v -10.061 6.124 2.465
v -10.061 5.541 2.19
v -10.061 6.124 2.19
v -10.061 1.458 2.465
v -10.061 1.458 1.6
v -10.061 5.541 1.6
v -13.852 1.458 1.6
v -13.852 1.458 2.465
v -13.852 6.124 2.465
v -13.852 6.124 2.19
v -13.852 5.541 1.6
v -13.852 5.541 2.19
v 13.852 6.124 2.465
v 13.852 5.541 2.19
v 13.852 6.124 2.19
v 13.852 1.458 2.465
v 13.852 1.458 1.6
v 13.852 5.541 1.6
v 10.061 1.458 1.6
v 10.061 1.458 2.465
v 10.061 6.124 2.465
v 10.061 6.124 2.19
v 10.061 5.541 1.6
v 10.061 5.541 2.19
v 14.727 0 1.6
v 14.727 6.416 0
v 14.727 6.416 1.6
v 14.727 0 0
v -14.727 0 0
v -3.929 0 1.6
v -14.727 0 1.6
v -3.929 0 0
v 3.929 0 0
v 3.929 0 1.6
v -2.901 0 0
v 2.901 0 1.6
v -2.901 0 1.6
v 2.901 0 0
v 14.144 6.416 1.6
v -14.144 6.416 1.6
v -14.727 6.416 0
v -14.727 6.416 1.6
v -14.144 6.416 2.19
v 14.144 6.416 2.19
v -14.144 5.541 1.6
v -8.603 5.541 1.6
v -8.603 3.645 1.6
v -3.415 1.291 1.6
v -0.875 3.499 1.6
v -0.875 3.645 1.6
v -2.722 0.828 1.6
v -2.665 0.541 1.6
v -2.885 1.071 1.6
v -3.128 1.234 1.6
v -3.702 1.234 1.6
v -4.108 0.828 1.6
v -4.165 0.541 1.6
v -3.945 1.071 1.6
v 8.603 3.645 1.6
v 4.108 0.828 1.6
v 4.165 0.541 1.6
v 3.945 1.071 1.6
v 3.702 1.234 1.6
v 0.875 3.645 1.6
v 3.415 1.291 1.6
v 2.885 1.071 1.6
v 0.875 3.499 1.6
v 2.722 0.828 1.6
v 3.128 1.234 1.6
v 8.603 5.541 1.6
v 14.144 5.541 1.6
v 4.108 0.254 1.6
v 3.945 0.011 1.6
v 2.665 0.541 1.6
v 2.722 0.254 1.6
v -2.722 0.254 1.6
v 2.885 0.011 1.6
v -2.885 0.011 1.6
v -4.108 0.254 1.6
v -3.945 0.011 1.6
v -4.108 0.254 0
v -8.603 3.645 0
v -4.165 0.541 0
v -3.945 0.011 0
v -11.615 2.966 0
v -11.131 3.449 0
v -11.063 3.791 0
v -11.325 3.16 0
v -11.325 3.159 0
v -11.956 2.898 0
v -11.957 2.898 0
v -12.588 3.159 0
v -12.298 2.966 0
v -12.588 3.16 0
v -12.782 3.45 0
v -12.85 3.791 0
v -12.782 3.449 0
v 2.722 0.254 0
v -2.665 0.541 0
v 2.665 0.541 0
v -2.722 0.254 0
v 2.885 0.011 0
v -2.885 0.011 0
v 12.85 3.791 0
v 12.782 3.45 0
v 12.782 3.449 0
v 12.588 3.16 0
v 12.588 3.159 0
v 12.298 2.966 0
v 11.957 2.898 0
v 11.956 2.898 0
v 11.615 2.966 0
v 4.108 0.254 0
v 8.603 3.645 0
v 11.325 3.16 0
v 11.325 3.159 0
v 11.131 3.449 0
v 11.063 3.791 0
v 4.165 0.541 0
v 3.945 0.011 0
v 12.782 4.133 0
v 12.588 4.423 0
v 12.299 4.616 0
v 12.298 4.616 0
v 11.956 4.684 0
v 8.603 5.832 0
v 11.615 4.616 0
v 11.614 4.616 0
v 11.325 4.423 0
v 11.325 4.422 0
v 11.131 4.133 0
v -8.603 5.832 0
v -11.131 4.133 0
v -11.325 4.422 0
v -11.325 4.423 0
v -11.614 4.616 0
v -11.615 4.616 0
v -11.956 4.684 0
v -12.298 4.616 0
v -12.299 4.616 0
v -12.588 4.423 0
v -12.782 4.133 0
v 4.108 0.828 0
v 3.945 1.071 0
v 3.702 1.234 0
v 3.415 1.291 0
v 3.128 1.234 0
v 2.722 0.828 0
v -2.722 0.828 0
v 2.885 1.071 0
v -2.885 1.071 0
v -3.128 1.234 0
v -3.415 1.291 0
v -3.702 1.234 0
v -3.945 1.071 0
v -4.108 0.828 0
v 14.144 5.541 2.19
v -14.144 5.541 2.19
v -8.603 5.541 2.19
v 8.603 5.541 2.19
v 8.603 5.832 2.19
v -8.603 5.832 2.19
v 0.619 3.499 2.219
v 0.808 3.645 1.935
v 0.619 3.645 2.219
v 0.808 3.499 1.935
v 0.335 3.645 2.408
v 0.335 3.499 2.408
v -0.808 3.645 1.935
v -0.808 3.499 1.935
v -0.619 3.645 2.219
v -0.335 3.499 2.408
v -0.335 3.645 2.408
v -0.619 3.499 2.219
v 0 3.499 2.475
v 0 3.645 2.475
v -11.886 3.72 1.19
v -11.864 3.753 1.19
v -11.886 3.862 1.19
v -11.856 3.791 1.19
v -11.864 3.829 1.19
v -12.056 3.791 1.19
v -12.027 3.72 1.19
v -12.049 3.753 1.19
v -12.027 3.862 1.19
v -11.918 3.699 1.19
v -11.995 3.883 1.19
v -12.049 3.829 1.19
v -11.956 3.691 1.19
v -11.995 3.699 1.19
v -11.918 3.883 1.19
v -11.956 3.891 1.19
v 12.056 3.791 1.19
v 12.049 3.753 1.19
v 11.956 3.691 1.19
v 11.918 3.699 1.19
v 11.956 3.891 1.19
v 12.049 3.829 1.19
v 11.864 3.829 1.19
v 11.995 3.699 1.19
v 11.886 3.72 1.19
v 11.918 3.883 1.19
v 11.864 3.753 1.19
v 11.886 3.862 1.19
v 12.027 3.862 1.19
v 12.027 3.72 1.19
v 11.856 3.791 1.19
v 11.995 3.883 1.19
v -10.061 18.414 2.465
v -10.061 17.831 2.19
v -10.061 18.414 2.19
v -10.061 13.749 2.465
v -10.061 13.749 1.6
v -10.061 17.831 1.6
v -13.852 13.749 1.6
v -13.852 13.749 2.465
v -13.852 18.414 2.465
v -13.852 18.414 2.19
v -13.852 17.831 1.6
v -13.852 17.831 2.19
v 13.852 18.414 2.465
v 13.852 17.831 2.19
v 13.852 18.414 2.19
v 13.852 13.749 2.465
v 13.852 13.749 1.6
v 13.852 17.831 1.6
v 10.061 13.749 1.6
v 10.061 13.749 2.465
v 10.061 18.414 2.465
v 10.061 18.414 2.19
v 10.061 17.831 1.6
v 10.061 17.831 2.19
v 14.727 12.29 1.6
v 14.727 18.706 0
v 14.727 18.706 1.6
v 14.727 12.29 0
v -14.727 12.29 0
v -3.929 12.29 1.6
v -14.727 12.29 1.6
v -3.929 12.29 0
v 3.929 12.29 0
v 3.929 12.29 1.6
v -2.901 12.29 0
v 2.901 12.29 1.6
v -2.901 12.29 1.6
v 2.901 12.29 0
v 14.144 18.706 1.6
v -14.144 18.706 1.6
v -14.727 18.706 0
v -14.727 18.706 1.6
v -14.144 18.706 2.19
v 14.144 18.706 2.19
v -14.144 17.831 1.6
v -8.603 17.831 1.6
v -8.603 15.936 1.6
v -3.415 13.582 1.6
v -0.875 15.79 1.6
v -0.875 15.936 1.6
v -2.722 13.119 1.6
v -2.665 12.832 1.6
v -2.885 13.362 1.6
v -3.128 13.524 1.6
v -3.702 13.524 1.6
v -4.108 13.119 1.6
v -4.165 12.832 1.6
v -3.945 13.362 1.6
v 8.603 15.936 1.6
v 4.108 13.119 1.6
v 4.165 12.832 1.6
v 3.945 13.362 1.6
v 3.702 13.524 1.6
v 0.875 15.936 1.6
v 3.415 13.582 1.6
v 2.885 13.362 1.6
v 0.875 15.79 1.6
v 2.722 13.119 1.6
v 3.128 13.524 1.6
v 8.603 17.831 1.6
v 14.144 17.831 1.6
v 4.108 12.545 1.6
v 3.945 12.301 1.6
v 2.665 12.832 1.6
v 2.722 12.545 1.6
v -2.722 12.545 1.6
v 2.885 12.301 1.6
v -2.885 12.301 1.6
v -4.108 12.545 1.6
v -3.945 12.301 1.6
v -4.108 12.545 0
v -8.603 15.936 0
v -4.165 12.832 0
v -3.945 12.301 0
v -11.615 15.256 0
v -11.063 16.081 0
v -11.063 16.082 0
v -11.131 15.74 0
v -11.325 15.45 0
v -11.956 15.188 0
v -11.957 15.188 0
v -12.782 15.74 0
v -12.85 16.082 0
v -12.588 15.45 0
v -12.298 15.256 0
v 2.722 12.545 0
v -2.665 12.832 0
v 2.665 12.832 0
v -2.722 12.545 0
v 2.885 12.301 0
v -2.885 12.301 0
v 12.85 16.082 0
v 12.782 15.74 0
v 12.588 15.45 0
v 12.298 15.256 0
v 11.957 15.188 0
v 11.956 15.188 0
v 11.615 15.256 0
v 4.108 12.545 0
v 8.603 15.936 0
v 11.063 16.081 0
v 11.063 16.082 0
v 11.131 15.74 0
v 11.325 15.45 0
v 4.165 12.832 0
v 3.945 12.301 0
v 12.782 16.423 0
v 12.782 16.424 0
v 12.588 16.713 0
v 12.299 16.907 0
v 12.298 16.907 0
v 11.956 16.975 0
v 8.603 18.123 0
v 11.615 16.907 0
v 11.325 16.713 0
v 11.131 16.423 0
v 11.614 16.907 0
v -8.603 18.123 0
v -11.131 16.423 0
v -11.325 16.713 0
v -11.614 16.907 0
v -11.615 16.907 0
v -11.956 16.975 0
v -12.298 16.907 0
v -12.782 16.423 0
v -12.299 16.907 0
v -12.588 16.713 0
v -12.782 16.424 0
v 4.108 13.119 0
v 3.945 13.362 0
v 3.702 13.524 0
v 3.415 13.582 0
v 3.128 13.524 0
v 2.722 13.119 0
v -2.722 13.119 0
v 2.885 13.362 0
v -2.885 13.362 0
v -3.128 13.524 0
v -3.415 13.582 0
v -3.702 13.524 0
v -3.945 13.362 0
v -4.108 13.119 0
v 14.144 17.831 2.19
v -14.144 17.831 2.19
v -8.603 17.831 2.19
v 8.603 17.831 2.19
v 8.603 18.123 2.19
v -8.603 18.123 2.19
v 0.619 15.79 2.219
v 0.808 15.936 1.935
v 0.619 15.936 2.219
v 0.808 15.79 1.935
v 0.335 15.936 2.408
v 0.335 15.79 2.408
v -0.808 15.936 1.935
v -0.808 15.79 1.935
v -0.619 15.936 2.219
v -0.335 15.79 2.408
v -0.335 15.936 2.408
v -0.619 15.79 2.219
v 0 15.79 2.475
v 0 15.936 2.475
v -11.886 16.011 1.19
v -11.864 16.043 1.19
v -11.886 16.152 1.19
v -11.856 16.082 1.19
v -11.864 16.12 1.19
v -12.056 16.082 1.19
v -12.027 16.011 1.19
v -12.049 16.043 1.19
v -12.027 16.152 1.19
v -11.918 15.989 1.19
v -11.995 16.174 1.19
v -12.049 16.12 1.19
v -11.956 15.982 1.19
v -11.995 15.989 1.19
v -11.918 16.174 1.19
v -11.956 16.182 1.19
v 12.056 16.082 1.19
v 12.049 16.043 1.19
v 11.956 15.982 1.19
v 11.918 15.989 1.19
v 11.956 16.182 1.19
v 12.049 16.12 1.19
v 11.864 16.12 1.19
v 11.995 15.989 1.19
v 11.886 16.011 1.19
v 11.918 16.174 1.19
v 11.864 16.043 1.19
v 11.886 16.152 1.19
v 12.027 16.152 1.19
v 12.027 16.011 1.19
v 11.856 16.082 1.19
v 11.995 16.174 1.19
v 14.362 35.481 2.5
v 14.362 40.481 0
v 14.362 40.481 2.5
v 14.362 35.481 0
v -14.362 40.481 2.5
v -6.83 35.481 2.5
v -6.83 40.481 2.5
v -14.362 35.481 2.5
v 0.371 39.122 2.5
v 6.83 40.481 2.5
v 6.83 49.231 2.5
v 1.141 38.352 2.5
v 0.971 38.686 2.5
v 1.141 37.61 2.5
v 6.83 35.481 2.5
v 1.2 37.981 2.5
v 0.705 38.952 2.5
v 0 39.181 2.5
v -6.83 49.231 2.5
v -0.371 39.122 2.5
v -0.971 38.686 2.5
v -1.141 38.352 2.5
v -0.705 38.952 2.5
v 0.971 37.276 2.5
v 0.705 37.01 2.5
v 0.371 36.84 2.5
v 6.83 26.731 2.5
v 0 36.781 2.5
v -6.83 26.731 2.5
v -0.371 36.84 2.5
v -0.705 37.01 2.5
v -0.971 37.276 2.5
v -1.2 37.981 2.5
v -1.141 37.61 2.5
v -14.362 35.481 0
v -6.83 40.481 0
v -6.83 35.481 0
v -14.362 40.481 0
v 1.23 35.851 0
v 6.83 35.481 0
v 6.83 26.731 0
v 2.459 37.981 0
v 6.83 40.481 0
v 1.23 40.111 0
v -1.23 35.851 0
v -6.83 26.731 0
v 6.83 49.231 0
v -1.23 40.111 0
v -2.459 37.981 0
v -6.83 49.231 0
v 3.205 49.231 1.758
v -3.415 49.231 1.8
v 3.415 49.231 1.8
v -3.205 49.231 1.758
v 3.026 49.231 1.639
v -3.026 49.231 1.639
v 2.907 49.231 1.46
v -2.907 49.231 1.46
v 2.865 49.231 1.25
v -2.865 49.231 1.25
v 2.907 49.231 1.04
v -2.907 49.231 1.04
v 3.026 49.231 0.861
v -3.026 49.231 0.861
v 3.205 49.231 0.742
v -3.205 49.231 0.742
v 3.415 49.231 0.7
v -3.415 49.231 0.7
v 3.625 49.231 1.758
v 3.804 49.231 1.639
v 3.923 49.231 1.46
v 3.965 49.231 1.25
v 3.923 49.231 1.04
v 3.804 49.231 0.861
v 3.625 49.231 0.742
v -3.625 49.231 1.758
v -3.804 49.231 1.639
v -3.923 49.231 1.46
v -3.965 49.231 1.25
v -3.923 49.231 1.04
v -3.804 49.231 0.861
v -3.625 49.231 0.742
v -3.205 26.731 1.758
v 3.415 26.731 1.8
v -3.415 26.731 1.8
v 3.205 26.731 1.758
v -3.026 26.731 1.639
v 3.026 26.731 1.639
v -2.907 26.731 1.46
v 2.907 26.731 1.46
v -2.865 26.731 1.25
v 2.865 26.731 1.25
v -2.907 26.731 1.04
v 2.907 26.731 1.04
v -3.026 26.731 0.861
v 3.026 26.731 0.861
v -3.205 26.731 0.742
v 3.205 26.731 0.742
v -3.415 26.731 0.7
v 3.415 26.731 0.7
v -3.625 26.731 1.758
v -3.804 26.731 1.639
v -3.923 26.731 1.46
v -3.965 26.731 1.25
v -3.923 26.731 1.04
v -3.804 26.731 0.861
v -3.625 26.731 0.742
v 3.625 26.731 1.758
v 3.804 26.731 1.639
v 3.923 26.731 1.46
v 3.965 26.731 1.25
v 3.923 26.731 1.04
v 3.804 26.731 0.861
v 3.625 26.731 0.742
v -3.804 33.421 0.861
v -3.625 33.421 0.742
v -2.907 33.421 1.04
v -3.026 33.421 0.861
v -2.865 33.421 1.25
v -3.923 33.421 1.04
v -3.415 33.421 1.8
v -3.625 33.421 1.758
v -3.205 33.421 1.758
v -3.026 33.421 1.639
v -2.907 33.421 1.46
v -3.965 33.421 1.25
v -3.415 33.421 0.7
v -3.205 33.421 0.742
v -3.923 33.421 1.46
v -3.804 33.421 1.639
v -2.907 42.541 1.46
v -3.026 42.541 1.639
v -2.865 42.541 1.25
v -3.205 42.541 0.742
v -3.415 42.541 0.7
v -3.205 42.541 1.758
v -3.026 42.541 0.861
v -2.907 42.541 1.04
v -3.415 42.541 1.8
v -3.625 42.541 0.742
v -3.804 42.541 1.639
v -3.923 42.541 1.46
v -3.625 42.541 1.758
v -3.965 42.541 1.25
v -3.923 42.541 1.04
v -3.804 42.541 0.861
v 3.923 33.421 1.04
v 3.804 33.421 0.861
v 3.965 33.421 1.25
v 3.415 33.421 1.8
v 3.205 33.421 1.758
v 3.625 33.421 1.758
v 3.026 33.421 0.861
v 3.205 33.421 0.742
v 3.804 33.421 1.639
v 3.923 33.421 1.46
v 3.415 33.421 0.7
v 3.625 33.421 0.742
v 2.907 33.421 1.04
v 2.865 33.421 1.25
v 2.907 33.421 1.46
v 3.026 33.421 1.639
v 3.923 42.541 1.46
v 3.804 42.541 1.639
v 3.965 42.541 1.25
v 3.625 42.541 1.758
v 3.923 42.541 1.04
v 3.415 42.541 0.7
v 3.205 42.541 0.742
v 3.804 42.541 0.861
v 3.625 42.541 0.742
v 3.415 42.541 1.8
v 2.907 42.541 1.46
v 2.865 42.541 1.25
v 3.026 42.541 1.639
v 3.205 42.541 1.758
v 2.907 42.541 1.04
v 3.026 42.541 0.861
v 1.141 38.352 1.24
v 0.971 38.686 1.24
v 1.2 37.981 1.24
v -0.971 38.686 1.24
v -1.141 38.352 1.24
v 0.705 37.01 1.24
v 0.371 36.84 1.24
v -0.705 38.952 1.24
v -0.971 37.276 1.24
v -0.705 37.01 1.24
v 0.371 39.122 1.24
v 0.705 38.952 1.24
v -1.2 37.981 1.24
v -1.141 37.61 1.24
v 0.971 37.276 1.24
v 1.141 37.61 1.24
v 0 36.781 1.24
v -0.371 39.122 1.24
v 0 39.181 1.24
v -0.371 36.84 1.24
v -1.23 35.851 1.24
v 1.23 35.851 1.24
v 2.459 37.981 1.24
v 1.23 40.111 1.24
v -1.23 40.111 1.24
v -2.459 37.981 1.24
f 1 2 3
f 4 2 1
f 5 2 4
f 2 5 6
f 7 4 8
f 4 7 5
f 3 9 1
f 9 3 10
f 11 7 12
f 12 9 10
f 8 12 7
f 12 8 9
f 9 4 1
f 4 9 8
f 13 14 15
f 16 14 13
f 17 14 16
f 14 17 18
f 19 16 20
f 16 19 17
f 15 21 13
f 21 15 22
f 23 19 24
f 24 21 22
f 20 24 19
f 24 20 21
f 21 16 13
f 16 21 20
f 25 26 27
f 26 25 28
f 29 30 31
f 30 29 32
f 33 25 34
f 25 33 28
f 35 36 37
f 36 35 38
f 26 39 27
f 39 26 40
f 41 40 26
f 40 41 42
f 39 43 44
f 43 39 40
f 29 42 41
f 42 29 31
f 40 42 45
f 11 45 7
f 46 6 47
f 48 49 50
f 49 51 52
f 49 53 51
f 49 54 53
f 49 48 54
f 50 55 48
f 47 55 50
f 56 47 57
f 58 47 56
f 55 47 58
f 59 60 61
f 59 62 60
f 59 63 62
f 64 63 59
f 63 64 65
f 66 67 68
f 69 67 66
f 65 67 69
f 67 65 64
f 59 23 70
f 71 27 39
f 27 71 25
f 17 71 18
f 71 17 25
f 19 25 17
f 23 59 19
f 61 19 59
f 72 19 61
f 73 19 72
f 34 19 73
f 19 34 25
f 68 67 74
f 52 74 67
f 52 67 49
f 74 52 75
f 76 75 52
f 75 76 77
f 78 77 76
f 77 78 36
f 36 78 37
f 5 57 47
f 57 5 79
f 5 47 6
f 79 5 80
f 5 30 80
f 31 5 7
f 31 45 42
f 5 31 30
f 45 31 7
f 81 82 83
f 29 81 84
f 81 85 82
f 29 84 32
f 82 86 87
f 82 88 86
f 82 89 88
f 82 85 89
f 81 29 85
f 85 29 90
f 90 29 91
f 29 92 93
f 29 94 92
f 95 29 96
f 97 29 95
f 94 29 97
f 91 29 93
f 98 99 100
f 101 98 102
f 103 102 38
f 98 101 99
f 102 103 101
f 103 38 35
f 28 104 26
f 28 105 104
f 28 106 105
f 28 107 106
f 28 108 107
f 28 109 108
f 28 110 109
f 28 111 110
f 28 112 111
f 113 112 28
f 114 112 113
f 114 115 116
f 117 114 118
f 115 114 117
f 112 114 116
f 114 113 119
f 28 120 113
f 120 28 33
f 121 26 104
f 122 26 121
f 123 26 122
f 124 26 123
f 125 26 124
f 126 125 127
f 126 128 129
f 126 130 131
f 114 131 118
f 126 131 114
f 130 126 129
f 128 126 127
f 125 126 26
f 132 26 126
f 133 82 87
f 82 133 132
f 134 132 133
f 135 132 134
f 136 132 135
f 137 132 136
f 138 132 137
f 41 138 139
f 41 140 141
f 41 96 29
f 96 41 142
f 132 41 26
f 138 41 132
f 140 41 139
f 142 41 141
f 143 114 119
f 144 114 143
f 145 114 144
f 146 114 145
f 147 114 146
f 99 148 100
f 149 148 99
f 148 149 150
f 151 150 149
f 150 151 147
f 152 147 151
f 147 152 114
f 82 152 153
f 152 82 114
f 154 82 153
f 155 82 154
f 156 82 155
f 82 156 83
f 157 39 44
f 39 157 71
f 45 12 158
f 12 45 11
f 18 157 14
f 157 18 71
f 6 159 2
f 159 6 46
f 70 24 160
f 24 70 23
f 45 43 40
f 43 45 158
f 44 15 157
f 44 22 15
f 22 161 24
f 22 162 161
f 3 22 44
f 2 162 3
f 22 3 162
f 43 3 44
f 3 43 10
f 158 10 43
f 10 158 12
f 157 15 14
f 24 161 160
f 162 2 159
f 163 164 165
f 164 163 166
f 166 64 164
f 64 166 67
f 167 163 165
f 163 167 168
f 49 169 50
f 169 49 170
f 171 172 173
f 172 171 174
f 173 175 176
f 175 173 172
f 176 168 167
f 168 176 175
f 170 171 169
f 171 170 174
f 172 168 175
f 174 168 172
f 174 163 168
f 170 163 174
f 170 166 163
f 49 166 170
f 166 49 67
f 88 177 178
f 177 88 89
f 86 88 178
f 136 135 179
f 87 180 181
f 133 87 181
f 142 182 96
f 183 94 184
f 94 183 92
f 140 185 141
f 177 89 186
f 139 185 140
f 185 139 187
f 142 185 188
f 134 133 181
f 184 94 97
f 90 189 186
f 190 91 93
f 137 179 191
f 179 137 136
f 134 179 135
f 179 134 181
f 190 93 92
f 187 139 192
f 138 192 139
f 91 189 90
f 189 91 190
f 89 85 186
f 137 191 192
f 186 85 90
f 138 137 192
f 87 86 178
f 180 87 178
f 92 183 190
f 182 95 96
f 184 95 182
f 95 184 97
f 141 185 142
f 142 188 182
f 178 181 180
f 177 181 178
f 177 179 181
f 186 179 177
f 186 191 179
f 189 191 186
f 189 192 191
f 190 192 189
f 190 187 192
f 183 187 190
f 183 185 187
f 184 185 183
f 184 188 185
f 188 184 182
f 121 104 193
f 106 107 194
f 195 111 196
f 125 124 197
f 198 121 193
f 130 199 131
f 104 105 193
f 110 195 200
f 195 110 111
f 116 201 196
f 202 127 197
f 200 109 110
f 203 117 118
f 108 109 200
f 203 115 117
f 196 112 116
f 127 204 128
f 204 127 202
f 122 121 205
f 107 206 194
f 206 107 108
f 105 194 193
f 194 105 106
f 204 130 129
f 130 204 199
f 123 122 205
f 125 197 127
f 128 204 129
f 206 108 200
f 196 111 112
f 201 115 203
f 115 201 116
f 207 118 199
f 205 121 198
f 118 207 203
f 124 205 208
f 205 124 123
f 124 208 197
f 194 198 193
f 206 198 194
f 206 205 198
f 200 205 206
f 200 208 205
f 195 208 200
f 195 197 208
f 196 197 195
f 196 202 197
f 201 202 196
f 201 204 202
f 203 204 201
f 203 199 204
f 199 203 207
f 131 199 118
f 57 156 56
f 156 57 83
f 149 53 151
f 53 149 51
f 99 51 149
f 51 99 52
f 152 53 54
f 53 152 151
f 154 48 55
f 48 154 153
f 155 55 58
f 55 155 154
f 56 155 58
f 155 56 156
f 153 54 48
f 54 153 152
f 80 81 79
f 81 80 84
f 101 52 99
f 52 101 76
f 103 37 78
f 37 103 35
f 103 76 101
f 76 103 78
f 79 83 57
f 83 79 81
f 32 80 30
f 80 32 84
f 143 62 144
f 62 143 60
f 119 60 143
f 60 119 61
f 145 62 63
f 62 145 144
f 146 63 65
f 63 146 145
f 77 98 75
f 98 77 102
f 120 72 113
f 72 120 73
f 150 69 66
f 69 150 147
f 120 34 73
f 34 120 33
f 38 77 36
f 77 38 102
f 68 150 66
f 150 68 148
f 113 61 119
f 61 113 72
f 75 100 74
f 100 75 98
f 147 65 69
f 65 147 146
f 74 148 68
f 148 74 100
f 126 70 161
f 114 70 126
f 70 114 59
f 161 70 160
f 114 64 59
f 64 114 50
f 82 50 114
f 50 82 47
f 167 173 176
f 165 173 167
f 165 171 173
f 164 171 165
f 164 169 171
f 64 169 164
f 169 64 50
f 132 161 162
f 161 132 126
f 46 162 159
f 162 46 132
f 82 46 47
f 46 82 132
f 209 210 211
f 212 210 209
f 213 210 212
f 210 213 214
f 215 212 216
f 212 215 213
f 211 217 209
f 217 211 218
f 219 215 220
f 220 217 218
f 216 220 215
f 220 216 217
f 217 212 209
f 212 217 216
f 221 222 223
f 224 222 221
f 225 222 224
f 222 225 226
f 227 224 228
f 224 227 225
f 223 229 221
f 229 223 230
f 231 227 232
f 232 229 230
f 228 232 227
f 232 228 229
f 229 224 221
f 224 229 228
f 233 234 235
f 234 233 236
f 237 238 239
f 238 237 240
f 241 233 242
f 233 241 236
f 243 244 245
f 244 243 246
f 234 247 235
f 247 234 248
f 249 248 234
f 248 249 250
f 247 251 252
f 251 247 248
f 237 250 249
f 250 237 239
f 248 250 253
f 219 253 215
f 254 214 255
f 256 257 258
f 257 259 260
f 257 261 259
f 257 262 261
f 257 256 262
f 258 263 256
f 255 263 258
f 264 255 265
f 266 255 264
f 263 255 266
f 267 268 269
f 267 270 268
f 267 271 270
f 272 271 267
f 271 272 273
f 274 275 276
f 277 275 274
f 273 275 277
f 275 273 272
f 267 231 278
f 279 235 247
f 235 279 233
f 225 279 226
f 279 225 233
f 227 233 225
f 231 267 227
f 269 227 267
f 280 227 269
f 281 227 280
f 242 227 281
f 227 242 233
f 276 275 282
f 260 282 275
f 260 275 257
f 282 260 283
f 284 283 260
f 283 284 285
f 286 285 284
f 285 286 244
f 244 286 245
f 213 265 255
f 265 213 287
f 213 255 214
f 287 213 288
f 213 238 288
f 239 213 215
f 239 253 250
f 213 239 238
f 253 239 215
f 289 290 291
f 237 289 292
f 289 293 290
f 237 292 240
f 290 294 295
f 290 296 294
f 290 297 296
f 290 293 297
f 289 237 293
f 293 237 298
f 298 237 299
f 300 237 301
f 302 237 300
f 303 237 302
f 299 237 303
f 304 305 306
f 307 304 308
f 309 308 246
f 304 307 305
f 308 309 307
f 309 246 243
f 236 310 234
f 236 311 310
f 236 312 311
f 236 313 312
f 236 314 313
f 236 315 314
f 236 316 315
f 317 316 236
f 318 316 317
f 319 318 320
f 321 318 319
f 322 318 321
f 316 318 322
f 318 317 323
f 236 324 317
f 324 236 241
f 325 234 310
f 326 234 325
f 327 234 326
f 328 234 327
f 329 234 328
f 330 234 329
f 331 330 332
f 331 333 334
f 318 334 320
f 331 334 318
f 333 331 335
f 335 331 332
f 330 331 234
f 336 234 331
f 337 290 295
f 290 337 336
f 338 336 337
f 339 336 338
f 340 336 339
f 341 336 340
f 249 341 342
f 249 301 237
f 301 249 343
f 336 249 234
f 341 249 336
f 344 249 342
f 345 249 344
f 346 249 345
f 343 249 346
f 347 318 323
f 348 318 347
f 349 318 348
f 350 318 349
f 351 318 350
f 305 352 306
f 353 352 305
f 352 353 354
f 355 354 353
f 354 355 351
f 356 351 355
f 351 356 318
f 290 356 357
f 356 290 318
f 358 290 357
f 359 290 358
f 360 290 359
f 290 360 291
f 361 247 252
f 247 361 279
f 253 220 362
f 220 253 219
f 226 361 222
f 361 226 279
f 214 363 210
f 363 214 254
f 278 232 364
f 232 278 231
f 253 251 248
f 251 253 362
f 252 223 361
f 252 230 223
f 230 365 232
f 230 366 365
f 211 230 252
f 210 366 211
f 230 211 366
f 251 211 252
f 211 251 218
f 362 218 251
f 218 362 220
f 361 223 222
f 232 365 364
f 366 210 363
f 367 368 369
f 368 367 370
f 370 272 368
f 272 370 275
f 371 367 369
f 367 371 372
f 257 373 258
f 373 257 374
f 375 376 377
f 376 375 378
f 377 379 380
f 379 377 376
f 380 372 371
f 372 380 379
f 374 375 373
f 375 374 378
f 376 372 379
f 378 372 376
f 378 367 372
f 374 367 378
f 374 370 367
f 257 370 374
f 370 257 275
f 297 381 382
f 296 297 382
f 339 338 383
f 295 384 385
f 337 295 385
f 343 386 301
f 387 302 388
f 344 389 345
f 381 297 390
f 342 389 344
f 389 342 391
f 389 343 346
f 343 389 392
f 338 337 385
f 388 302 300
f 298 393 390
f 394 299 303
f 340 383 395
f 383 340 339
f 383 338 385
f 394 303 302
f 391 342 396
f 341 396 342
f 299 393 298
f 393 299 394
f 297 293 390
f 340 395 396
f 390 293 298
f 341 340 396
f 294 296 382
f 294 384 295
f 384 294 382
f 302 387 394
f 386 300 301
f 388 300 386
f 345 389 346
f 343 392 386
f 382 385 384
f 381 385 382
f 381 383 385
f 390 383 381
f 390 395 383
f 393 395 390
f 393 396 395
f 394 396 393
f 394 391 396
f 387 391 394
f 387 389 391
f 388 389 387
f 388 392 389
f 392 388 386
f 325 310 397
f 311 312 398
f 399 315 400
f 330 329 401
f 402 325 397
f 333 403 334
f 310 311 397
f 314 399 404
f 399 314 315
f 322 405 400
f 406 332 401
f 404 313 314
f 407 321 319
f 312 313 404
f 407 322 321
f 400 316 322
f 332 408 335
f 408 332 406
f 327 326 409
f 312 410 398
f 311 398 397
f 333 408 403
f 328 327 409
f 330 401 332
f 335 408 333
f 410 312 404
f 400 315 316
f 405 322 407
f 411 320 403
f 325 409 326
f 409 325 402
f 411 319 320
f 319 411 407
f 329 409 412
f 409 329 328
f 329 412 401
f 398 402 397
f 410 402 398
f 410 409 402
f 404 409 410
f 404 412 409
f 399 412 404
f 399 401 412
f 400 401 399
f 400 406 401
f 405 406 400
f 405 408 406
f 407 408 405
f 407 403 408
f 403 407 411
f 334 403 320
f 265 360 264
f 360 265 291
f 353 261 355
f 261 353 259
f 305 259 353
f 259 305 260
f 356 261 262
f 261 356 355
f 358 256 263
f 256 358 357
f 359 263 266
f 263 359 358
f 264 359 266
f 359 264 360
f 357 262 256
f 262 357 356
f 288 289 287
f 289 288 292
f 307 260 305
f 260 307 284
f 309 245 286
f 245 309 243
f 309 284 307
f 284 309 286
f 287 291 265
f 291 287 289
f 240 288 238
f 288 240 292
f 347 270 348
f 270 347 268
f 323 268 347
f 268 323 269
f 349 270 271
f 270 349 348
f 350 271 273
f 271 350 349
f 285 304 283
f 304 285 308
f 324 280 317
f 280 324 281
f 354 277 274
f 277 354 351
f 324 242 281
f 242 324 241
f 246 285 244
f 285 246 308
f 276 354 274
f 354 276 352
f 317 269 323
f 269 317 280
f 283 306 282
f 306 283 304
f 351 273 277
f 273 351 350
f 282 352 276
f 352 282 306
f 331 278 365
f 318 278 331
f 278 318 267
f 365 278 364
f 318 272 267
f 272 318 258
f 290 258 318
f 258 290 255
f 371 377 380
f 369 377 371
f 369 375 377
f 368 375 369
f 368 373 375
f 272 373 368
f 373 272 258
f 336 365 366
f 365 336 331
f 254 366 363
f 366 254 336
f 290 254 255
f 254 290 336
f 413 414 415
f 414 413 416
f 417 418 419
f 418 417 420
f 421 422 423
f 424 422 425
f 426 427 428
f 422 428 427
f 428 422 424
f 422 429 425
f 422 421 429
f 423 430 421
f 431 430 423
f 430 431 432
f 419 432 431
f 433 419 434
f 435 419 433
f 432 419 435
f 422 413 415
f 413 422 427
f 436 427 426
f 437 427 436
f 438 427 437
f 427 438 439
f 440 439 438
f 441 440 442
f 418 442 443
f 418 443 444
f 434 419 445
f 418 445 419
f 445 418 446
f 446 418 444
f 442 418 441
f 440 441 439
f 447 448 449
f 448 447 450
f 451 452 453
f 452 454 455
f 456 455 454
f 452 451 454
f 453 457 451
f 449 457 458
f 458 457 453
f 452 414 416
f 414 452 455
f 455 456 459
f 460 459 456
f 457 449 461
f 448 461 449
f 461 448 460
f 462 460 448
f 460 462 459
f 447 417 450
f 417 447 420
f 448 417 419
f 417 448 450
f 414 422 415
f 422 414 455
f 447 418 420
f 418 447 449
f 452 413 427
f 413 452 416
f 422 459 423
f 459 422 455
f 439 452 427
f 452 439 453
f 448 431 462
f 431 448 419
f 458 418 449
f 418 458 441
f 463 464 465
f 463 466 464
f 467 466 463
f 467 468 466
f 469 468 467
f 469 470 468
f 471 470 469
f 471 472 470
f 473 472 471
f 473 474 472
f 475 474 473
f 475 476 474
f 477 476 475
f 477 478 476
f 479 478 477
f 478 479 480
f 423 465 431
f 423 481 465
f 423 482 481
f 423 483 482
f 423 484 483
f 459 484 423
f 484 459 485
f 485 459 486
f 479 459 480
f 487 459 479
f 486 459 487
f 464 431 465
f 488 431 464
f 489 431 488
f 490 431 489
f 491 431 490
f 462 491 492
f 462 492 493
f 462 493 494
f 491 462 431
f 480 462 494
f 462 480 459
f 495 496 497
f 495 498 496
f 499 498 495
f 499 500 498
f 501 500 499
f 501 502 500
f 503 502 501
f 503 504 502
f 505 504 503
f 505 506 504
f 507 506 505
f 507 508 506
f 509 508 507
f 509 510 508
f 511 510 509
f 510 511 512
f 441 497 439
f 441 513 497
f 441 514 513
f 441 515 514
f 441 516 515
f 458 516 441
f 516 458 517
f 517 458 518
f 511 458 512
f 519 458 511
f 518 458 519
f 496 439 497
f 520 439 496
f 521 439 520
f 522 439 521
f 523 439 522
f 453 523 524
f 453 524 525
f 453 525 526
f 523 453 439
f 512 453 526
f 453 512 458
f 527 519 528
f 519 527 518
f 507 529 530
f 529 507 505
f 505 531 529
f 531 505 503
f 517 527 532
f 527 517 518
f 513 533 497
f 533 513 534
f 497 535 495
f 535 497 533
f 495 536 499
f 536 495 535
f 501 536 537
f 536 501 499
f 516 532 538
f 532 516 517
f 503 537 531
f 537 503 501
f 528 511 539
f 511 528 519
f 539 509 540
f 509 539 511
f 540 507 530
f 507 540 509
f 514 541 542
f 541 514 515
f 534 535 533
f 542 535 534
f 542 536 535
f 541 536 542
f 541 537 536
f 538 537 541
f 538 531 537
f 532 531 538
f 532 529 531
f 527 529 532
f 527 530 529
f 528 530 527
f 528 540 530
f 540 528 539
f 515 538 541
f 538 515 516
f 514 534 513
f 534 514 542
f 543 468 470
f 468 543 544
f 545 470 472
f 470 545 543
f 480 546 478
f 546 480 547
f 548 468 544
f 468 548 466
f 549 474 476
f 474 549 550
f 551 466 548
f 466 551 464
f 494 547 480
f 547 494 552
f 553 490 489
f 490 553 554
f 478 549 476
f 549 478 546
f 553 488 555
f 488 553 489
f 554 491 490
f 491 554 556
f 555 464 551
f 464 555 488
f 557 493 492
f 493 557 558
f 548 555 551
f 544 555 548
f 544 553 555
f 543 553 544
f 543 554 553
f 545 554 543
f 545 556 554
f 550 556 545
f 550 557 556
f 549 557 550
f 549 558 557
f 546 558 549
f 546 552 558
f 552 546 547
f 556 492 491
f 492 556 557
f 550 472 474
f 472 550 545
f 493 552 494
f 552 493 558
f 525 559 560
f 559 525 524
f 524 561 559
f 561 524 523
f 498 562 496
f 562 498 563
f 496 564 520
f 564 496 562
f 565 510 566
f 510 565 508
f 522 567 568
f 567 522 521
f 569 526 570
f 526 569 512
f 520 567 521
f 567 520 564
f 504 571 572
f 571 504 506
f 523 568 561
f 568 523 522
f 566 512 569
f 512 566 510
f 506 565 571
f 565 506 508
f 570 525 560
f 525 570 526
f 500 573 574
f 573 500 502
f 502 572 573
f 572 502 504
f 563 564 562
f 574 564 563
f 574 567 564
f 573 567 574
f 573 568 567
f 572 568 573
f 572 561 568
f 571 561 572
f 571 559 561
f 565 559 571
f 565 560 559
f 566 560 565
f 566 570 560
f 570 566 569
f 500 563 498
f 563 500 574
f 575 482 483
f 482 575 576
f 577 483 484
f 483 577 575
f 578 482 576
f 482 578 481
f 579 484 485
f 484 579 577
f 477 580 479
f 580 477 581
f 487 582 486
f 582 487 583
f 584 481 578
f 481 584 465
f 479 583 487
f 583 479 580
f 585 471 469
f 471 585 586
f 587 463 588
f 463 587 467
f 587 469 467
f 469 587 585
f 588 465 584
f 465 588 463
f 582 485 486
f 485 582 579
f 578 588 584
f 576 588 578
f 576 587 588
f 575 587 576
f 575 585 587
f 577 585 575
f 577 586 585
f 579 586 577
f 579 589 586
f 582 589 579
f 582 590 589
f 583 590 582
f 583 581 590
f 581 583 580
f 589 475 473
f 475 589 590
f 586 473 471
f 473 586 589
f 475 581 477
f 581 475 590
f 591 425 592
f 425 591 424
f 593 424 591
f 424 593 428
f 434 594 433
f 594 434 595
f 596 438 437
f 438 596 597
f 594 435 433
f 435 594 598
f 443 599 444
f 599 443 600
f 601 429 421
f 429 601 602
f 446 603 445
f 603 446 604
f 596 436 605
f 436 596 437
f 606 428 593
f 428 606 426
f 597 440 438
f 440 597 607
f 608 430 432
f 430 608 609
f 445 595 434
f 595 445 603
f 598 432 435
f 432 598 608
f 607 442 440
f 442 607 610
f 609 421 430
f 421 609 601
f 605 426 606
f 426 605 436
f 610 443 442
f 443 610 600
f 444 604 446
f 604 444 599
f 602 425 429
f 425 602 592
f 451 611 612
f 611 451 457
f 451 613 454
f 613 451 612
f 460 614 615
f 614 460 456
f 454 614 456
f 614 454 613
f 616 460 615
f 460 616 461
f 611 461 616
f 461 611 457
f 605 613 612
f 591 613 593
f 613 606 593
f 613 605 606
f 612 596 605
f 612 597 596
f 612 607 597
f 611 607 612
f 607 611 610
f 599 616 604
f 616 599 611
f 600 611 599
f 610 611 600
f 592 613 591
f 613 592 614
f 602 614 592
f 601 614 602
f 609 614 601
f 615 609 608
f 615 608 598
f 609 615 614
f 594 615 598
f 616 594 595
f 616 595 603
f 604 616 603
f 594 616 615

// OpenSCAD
// Milwaukee Road Little Joe, HO scale 1-87 - print 11 of 11: truck_guide - 2-axle guide truck - print 2
// Render (F6), export STL, print. Settings: ../../library/lj_params.scad
// Whole loco preview and notes: ../../MILW_LittleJoe_Main.scad
SCALE_SEL = "HO";
LOCO_SEL = "E70";   // [E20, E21, E70, E71, E72, E73, E74, E75, E76, E77, E78, E79] the body and roof change for E20 / E21
include <../../library/lj_all.scad>
lj_plate("truck_guide");
